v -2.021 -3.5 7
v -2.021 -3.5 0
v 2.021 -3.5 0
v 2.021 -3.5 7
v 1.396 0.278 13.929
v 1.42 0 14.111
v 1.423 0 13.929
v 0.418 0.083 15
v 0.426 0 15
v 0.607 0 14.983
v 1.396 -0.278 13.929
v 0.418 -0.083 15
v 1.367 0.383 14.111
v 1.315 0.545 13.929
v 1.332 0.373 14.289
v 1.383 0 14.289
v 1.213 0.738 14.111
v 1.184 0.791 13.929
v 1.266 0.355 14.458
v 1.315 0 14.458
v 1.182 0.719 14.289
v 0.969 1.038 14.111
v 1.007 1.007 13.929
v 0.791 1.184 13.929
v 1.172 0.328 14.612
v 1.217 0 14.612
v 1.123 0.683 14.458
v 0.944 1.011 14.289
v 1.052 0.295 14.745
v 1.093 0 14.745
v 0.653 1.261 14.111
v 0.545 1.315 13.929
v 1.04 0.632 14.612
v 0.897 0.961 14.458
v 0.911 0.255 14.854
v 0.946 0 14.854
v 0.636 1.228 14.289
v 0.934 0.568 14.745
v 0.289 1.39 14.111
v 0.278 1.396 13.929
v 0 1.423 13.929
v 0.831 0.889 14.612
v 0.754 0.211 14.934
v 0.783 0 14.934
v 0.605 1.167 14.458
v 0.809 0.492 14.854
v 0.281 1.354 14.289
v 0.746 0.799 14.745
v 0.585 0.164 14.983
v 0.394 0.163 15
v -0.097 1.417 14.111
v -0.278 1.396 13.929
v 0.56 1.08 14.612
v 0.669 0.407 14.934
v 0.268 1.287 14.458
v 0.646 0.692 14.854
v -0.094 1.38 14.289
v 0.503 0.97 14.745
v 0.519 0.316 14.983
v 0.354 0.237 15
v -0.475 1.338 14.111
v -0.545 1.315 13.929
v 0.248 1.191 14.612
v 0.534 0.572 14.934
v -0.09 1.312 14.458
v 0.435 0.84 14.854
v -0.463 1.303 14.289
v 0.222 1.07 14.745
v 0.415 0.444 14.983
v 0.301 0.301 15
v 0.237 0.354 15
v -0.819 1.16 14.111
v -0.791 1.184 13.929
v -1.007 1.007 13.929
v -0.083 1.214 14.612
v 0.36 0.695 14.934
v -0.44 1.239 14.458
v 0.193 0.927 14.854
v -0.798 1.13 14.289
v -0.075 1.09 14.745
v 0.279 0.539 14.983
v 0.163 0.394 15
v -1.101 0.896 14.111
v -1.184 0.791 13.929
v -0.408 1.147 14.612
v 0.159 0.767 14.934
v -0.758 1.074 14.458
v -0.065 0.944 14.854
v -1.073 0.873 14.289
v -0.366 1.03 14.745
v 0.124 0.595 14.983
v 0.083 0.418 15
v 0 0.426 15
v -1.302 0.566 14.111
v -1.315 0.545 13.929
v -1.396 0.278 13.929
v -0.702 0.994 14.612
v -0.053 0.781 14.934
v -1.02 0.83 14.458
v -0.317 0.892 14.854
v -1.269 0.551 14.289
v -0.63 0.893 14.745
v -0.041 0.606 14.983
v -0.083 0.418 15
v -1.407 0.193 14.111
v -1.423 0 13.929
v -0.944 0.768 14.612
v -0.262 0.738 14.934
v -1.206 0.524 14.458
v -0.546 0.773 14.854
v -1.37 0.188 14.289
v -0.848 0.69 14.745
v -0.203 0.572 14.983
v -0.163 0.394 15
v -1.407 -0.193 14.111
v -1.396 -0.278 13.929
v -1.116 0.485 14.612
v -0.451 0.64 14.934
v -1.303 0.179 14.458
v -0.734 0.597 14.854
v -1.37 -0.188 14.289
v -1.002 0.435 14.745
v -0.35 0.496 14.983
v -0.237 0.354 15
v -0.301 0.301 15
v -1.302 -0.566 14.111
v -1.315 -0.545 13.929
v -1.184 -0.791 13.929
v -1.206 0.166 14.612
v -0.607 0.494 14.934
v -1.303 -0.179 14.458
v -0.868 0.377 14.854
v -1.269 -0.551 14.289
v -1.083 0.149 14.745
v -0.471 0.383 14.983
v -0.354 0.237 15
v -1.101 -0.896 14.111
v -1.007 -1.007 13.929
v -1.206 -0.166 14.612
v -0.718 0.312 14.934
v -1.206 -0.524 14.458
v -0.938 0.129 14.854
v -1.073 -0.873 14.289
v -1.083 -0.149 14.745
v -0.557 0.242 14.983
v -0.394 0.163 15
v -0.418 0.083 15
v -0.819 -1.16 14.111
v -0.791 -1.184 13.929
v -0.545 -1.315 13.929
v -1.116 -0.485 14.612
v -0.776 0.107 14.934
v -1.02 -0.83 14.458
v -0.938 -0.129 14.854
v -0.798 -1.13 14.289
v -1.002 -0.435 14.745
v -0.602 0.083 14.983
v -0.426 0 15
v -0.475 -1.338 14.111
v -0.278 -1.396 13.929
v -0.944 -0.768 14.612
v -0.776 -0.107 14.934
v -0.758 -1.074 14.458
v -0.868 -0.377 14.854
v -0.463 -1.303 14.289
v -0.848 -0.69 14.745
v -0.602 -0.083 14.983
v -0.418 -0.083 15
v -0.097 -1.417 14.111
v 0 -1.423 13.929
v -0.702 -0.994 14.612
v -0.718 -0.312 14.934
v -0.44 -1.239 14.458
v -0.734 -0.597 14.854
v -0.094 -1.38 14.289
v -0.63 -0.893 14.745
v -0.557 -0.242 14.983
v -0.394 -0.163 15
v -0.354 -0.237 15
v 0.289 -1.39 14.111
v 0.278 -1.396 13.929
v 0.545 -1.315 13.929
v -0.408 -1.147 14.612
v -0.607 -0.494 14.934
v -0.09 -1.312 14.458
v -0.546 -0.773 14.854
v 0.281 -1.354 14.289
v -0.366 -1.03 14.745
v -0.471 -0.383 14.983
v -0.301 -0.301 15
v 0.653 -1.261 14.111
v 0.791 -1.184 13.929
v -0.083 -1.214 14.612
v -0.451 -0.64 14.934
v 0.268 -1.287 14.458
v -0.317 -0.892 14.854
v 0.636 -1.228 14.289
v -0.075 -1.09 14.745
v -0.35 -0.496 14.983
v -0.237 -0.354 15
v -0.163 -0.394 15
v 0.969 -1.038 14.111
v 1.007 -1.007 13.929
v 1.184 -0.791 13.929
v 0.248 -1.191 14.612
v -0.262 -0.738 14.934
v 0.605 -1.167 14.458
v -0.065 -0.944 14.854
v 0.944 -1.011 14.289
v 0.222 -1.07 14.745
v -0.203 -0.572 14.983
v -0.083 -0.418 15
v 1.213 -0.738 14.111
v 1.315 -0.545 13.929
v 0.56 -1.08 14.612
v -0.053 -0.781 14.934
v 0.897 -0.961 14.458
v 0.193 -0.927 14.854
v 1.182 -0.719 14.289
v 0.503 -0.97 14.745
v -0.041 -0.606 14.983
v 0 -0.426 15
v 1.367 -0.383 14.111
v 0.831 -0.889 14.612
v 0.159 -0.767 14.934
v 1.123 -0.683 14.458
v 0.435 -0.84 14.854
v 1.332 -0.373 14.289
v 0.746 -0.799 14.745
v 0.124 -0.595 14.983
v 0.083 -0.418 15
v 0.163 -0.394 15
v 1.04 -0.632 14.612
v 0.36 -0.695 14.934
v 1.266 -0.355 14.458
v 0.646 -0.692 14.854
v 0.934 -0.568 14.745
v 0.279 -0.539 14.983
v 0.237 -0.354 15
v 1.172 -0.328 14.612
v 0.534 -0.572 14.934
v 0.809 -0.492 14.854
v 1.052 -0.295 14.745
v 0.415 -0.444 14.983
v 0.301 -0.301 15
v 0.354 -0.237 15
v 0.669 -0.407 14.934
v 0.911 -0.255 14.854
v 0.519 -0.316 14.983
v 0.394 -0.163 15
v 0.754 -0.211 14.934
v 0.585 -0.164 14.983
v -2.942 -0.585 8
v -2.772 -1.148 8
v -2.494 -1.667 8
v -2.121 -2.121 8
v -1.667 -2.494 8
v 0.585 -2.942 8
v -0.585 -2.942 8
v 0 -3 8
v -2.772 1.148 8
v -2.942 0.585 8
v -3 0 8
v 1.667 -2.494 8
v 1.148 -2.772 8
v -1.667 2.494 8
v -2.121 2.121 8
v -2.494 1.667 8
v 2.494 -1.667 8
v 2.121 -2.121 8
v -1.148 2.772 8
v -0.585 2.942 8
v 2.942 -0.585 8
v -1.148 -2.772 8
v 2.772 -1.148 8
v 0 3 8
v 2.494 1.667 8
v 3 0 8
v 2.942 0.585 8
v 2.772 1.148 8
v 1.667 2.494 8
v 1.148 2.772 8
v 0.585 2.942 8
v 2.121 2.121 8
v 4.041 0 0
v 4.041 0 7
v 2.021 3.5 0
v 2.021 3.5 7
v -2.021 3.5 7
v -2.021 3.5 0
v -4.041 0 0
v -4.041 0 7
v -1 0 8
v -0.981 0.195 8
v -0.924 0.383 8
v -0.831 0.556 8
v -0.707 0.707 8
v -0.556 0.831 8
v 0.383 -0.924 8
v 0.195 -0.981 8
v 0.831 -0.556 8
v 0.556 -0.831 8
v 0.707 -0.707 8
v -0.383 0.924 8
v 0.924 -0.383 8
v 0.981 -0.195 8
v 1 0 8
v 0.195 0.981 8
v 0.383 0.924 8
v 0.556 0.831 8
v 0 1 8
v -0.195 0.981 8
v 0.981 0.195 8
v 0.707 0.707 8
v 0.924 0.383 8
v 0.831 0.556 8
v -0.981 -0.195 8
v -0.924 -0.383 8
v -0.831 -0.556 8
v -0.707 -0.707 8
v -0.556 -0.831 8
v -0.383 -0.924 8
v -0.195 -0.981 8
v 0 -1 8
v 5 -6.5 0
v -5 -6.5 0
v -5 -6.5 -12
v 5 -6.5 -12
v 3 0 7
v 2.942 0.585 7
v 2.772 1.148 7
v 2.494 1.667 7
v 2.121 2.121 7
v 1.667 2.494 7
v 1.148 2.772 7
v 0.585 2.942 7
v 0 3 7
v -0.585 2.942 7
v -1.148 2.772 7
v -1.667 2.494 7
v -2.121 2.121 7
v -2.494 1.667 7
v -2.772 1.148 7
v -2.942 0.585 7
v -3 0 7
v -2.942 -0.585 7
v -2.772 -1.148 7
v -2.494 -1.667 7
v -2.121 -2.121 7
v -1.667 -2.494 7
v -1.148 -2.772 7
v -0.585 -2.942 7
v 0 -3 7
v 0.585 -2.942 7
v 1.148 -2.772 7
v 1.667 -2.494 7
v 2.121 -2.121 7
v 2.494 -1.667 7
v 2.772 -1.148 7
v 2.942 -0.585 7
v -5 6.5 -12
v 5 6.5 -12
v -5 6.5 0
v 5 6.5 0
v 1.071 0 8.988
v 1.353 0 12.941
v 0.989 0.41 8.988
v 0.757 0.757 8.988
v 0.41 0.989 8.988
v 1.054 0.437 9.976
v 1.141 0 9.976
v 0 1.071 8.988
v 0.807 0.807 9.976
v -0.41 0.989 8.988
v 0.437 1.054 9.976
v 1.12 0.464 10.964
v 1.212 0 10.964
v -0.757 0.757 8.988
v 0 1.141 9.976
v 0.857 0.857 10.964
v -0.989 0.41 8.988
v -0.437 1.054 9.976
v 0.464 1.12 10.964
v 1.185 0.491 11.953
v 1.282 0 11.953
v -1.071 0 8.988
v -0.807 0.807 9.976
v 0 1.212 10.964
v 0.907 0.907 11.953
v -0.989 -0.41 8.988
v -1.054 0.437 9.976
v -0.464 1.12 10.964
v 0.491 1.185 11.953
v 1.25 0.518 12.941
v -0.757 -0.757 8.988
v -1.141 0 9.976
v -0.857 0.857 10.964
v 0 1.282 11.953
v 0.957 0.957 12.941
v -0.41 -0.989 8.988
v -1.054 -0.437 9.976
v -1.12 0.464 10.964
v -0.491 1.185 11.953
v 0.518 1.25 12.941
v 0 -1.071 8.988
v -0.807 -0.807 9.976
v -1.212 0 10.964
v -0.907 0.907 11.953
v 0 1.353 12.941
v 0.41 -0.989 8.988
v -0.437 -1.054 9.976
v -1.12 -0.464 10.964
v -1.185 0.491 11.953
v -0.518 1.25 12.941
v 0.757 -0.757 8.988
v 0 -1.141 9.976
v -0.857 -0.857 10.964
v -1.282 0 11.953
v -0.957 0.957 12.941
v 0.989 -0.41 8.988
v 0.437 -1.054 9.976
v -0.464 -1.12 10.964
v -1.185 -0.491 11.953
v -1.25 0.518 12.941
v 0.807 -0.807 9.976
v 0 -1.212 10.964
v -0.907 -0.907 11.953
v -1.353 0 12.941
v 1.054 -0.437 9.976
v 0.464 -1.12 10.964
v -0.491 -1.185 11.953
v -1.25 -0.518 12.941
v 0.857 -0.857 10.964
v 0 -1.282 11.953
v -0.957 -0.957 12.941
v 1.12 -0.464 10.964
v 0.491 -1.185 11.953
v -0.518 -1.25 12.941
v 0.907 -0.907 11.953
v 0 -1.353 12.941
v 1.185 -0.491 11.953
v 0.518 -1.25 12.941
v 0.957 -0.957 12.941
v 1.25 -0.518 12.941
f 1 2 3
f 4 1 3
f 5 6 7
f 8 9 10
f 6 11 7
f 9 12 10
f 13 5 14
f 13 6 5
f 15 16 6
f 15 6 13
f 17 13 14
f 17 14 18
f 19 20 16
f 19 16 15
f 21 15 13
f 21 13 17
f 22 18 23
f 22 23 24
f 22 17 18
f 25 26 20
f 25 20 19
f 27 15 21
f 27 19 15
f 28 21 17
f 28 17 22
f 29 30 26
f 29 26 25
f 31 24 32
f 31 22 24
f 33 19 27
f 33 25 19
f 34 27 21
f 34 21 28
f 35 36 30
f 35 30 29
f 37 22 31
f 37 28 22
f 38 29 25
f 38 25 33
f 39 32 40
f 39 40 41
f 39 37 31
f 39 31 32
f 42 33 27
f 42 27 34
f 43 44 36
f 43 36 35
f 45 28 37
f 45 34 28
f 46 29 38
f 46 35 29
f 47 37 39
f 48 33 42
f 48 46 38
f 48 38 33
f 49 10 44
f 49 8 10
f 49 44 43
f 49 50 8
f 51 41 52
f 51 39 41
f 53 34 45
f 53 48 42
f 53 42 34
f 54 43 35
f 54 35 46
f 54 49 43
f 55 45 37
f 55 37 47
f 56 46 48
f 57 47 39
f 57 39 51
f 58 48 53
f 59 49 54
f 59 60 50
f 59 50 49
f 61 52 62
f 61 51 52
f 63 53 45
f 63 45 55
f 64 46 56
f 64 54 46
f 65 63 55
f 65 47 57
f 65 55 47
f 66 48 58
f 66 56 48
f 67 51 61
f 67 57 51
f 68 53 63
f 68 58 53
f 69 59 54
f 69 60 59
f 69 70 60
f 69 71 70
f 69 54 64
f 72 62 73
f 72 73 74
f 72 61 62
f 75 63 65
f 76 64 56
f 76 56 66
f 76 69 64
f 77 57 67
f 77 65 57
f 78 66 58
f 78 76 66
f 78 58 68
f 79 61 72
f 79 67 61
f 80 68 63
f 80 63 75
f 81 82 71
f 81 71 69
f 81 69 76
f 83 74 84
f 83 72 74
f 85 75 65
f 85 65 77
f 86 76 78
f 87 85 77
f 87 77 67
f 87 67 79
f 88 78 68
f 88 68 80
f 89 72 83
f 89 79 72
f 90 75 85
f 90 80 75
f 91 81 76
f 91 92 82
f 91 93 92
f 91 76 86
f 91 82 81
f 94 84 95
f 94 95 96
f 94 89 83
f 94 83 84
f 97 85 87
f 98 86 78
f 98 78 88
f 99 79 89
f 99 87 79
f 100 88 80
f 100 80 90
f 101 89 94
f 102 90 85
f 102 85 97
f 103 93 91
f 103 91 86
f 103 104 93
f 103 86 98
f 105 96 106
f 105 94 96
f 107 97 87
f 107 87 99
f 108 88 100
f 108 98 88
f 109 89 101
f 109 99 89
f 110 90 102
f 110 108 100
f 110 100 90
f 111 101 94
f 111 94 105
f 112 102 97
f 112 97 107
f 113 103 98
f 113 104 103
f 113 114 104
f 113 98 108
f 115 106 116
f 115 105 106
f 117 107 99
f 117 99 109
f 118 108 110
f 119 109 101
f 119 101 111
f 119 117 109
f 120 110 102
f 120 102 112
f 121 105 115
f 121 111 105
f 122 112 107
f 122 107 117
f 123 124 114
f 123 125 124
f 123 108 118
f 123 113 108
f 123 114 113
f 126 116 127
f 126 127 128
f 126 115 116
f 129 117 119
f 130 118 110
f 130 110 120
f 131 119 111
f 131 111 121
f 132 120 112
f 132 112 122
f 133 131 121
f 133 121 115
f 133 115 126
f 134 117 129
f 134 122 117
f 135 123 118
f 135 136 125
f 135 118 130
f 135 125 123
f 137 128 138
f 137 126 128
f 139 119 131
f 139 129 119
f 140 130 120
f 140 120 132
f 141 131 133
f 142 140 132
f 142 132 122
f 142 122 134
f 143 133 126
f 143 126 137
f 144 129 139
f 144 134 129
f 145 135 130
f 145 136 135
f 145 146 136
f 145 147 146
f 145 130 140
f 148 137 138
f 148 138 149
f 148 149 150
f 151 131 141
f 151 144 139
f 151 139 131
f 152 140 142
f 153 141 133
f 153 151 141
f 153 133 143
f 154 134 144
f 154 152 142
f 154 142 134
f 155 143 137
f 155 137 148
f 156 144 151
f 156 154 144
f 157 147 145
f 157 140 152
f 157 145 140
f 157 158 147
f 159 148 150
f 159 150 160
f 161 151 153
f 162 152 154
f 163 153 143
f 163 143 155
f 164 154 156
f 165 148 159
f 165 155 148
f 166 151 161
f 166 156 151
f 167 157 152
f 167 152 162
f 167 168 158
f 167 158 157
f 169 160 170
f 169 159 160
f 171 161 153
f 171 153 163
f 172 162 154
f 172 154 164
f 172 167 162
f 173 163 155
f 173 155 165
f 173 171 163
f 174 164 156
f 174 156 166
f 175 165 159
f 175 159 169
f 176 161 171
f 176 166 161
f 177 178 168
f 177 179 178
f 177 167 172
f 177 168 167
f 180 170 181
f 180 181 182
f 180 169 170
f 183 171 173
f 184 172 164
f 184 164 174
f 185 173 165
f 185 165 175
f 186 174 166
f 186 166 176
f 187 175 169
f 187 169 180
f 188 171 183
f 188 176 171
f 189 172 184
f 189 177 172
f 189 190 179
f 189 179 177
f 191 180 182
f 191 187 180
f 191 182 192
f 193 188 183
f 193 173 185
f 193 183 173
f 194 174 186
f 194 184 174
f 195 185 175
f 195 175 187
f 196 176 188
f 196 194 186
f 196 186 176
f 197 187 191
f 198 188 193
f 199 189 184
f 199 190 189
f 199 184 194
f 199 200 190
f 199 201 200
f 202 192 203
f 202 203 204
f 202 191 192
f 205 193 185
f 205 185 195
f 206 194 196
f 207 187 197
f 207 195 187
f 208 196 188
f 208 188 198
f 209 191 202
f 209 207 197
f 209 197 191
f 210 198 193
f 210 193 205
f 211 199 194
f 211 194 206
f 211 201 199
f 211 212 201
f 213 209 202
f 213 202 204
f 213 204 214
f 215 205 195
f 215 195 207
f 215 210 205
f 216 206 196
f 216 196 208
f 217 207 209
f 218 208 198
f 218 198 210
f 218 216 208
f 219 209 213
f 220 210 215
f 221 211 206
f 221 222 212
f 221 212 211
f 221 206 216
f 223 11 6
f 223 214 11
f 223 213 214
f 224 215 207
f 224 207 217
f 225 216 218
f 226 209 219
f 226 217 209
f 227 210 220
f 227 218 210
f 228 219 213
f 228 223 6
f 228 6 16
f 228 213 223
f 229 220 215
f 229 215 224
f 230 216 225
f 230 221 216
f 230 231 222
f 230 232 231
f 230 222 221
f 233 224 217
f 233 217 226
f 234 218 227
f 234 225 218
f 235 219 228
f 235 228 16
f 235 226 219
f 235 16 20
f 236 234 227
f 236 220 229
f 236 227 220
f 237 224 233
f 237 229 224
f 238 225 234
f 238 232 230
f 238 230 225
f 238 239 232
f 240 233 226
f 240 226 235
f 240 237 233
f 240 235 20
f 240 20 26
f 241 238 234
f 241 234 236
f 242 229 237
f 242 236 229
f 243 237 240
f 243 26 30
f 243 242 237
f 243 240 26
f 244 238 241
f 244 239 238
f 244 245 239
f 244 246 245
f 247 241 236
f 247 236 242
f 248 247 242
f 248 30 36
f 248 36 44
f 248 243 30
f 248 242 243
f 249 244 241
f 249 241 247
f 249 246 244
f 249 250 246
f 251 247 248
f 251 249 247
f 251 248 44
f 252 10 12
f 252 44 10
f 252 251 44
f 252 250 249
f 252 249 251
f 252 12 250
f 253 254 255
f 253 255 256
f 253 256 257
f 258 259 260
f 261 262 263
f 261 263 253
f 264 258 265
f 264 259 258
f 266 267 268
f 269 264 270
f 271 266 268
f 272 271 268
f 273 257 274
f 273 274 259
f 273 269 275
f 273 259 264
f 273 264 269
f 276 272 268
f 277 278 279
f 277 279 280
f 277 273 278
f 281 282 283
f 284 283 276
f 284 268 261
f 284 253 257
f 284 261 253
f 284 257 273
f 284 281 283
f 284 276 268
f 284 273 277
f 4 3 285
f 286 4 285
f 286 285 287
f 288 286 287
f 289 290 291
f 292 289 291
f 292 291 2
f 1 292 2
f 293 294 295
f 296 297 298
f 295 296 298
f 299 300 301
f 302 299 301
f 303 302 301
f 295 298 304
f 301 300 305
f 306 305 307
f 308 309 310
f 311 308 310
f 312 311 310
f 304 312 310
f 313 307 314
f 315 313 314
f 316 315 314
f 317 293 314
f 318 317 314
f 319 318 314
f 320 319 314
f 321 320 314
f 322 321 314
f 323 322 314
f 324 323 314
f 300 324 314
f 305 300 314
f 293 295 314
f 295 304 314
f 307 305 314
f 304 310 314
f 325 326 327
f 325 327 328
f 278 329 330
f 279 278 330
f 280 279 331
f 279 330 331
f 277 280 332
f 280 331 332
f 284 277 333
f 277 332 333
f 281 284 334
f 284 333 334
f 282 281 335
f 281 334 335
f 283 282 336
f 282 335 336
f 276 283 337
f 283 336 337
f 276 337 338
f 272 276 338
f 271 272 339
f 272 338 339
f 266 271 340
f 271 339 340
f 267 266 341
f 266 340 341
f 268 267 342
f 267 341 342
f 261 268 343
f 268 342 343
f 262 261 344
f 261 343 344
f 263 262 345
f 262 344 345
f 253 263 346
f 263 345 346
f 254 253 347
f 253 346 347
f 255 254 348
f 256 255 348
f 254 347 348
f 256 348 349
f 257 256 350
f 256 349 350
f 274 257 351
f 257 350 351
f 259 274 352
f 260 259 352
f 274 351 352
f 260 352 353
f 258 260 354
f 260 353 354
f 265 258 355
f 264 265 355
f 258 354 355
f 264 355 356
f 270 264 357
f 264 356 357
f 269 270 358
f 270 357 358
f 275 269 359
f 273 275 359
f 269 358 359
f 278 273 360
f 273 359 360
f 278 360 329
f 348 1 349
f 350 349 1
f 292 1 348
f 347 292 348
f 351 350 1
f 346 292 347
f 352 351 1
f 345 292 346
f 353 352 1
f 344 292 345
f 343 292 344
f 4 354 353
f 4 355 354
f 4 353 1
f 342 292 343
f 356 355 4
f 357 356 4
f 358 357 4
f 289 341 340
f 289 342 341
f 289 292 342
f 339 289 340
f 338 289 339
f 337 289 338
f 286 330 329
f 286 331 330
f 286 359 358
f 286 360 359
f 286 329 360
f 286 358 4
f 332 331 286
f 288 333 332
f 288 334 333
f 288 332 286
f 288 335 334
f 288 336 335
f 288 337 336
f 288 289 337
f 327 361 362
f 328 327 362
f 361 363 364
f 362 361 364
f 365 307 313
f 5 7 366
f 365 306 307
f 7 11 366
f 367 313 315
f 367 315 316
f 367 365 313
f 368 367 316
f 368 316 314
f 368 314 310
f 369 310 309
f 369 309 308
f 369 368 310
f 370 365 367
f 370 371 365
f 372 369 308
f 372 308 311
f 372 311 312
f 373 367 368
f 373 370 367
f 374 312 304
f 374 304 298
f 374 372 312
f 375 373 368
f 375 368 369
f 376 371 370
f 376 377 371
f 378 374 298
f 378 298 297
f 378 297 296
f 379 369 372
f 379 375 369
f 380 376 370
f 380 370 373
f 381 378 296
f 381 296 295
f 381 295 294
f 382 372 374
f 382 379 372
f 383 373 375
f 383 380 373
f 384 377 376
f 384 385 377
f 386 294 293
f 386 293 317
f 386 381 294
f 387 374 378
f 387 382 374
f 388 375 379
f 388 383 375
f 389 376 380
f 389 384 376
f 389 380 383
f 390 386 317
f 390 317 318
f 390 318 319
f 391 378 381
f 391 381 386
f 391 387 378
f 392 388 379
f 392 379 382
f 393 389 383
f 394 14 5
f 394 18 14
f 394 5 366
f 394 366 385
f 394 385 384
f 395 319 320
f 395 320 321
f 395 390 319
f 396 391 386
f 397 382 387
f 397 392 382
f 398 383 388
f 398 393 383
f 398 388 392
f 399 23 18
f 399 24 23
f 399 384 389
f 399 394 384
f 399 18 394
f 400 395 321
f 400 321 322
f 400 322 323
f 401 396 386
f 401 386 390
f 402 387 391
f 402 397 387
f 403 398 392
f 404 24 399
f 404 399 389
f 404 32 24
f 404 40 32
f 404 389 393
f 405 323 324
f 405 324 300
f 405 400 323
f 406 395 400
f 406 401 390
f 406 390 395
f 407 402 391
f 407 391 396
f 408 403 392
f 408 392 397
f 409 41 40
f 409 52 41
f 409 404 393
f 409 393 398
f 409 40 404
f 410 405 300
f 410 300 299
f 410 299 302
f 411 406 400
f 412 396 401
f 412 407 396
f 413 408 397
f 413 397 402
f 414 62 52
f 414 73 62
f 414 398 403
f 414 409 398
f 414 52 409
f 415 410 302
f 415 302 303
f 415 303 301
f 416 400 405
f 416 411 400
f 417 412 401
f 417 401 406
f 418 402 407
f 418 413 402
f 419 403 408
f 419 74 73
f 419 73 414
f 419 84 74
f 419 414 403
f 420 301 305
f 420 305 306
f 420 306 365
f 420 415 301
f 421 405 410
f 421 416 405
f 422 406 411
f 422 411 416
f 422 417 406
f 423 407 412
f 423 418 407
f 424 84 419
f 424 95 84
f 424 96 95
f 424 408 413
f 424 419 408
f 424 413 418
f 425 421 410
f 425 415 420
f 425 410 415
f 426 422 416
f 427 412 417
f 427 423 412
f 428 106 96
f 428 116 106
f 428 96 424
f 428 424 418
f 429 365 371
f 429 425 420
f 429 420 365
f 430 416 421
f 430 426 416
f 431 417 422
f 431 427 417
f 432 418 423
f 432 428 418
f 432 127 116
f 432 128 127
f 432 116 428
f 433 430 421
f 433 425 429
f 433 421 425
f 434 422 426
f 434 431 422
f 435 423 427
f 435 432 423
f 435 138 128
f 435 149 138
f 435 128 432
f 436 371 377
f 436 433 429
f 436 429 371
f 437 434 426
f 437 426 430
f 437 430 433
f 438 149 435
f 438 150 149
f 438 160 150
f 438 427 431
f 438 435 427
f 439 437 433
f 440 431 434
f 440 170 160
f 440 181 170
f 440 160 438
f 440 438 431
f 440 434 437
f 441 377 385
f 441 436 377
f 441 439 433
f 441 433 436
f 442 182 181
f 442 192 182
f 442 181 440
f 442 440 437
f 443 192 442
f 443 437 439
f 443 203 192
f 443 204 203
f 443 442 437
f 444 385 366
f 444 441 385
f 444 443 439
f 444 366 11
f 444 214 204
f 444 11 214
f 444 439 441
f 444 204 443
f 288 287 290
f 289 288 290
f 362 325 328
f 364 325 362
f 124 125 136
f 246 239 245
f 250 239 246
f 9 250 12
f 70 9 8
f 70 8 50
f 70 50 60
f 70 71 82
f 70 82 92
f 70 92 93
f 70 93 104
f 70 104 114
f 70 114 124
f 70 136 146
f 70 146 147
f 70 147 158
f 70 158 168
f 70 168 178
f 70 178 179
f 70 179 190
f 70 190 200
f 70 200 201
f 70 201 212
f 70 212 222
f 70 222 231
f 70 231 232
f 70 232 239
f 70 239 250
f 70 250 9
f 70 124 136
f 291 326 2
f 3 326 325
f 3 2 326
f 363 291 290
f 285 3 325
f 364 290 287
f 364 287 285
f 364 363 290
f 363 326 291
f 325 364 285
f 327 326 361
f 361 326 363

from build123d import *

# Parameters (mm, degrees)
F0_W     = 10
F0_H     = 13
F1_DEPTH = 12
F2_DEPTH = 7
F3_R     = 3
F4_DEPTH = 1
F5_R     = 1
F7_R     = 1.5
F9_R     = 1


with BuildPart() as f1:
    # F0 (on Top) → F1 (new body)
    with BuildSketch(Plane.XY):
        Rectangle(F0_W, F0_H)
        Polygon((4.0414518843, 0), (2.0207259422, -3.5), (-2.0207259422, -3.5), (-4.0414518843, 0), (-2.0207259422, 3.5), (2.0207259422, 3.5), align=None, mode=Mode.SUBTRACT)
        Polygon((-2.0207259422, -3.5), (2.0207259422, -3.5), (4.0414518843, 0), (2.0207259422, 3.5), (-2.0207259422, 3.5), (-4.0414518843, 0), align=None)
    extrude(amount=-F1_DEPTH)

    # F0 (on Top) → F2 (join)
    with BuildSketch(Plane.XY):
        Polygon((-2.0207259422, -3.5), (2.0207259422, -3.5), (4.0414518843, 0), (2.0207259422, 3.5), (-2.0207259422, 3.5), (-4.0414518843, 0), align=None)
    extrude(amount=F2_DEPTH)

    # F3 (on face) → F4 (join)
    with BuildSketch(Plane.XY.offset(7)):
        Circle(F3_R)
    extrude(amount=F4_DEPTH)


with BuildPart() as f8:
    # F5 (on face) → F8 section 0
    with BuildSketch(Plane.XY.offset(8)):
        Circle(F5_R)
    # F7 (on offset) → F8 section 1
    with BuildSketch(Plane.XY.offset(15)):
        Circle(F7_R)
    loft()

    # F9
    f9_edges = [f8.edges().sort_by_distance(p)[0] for p in [
        (-1.5, 0, 15),
    ]]
    fillet(f9_edges, radius=F9_R)


solid = Compound([f1.part, f8.part])
